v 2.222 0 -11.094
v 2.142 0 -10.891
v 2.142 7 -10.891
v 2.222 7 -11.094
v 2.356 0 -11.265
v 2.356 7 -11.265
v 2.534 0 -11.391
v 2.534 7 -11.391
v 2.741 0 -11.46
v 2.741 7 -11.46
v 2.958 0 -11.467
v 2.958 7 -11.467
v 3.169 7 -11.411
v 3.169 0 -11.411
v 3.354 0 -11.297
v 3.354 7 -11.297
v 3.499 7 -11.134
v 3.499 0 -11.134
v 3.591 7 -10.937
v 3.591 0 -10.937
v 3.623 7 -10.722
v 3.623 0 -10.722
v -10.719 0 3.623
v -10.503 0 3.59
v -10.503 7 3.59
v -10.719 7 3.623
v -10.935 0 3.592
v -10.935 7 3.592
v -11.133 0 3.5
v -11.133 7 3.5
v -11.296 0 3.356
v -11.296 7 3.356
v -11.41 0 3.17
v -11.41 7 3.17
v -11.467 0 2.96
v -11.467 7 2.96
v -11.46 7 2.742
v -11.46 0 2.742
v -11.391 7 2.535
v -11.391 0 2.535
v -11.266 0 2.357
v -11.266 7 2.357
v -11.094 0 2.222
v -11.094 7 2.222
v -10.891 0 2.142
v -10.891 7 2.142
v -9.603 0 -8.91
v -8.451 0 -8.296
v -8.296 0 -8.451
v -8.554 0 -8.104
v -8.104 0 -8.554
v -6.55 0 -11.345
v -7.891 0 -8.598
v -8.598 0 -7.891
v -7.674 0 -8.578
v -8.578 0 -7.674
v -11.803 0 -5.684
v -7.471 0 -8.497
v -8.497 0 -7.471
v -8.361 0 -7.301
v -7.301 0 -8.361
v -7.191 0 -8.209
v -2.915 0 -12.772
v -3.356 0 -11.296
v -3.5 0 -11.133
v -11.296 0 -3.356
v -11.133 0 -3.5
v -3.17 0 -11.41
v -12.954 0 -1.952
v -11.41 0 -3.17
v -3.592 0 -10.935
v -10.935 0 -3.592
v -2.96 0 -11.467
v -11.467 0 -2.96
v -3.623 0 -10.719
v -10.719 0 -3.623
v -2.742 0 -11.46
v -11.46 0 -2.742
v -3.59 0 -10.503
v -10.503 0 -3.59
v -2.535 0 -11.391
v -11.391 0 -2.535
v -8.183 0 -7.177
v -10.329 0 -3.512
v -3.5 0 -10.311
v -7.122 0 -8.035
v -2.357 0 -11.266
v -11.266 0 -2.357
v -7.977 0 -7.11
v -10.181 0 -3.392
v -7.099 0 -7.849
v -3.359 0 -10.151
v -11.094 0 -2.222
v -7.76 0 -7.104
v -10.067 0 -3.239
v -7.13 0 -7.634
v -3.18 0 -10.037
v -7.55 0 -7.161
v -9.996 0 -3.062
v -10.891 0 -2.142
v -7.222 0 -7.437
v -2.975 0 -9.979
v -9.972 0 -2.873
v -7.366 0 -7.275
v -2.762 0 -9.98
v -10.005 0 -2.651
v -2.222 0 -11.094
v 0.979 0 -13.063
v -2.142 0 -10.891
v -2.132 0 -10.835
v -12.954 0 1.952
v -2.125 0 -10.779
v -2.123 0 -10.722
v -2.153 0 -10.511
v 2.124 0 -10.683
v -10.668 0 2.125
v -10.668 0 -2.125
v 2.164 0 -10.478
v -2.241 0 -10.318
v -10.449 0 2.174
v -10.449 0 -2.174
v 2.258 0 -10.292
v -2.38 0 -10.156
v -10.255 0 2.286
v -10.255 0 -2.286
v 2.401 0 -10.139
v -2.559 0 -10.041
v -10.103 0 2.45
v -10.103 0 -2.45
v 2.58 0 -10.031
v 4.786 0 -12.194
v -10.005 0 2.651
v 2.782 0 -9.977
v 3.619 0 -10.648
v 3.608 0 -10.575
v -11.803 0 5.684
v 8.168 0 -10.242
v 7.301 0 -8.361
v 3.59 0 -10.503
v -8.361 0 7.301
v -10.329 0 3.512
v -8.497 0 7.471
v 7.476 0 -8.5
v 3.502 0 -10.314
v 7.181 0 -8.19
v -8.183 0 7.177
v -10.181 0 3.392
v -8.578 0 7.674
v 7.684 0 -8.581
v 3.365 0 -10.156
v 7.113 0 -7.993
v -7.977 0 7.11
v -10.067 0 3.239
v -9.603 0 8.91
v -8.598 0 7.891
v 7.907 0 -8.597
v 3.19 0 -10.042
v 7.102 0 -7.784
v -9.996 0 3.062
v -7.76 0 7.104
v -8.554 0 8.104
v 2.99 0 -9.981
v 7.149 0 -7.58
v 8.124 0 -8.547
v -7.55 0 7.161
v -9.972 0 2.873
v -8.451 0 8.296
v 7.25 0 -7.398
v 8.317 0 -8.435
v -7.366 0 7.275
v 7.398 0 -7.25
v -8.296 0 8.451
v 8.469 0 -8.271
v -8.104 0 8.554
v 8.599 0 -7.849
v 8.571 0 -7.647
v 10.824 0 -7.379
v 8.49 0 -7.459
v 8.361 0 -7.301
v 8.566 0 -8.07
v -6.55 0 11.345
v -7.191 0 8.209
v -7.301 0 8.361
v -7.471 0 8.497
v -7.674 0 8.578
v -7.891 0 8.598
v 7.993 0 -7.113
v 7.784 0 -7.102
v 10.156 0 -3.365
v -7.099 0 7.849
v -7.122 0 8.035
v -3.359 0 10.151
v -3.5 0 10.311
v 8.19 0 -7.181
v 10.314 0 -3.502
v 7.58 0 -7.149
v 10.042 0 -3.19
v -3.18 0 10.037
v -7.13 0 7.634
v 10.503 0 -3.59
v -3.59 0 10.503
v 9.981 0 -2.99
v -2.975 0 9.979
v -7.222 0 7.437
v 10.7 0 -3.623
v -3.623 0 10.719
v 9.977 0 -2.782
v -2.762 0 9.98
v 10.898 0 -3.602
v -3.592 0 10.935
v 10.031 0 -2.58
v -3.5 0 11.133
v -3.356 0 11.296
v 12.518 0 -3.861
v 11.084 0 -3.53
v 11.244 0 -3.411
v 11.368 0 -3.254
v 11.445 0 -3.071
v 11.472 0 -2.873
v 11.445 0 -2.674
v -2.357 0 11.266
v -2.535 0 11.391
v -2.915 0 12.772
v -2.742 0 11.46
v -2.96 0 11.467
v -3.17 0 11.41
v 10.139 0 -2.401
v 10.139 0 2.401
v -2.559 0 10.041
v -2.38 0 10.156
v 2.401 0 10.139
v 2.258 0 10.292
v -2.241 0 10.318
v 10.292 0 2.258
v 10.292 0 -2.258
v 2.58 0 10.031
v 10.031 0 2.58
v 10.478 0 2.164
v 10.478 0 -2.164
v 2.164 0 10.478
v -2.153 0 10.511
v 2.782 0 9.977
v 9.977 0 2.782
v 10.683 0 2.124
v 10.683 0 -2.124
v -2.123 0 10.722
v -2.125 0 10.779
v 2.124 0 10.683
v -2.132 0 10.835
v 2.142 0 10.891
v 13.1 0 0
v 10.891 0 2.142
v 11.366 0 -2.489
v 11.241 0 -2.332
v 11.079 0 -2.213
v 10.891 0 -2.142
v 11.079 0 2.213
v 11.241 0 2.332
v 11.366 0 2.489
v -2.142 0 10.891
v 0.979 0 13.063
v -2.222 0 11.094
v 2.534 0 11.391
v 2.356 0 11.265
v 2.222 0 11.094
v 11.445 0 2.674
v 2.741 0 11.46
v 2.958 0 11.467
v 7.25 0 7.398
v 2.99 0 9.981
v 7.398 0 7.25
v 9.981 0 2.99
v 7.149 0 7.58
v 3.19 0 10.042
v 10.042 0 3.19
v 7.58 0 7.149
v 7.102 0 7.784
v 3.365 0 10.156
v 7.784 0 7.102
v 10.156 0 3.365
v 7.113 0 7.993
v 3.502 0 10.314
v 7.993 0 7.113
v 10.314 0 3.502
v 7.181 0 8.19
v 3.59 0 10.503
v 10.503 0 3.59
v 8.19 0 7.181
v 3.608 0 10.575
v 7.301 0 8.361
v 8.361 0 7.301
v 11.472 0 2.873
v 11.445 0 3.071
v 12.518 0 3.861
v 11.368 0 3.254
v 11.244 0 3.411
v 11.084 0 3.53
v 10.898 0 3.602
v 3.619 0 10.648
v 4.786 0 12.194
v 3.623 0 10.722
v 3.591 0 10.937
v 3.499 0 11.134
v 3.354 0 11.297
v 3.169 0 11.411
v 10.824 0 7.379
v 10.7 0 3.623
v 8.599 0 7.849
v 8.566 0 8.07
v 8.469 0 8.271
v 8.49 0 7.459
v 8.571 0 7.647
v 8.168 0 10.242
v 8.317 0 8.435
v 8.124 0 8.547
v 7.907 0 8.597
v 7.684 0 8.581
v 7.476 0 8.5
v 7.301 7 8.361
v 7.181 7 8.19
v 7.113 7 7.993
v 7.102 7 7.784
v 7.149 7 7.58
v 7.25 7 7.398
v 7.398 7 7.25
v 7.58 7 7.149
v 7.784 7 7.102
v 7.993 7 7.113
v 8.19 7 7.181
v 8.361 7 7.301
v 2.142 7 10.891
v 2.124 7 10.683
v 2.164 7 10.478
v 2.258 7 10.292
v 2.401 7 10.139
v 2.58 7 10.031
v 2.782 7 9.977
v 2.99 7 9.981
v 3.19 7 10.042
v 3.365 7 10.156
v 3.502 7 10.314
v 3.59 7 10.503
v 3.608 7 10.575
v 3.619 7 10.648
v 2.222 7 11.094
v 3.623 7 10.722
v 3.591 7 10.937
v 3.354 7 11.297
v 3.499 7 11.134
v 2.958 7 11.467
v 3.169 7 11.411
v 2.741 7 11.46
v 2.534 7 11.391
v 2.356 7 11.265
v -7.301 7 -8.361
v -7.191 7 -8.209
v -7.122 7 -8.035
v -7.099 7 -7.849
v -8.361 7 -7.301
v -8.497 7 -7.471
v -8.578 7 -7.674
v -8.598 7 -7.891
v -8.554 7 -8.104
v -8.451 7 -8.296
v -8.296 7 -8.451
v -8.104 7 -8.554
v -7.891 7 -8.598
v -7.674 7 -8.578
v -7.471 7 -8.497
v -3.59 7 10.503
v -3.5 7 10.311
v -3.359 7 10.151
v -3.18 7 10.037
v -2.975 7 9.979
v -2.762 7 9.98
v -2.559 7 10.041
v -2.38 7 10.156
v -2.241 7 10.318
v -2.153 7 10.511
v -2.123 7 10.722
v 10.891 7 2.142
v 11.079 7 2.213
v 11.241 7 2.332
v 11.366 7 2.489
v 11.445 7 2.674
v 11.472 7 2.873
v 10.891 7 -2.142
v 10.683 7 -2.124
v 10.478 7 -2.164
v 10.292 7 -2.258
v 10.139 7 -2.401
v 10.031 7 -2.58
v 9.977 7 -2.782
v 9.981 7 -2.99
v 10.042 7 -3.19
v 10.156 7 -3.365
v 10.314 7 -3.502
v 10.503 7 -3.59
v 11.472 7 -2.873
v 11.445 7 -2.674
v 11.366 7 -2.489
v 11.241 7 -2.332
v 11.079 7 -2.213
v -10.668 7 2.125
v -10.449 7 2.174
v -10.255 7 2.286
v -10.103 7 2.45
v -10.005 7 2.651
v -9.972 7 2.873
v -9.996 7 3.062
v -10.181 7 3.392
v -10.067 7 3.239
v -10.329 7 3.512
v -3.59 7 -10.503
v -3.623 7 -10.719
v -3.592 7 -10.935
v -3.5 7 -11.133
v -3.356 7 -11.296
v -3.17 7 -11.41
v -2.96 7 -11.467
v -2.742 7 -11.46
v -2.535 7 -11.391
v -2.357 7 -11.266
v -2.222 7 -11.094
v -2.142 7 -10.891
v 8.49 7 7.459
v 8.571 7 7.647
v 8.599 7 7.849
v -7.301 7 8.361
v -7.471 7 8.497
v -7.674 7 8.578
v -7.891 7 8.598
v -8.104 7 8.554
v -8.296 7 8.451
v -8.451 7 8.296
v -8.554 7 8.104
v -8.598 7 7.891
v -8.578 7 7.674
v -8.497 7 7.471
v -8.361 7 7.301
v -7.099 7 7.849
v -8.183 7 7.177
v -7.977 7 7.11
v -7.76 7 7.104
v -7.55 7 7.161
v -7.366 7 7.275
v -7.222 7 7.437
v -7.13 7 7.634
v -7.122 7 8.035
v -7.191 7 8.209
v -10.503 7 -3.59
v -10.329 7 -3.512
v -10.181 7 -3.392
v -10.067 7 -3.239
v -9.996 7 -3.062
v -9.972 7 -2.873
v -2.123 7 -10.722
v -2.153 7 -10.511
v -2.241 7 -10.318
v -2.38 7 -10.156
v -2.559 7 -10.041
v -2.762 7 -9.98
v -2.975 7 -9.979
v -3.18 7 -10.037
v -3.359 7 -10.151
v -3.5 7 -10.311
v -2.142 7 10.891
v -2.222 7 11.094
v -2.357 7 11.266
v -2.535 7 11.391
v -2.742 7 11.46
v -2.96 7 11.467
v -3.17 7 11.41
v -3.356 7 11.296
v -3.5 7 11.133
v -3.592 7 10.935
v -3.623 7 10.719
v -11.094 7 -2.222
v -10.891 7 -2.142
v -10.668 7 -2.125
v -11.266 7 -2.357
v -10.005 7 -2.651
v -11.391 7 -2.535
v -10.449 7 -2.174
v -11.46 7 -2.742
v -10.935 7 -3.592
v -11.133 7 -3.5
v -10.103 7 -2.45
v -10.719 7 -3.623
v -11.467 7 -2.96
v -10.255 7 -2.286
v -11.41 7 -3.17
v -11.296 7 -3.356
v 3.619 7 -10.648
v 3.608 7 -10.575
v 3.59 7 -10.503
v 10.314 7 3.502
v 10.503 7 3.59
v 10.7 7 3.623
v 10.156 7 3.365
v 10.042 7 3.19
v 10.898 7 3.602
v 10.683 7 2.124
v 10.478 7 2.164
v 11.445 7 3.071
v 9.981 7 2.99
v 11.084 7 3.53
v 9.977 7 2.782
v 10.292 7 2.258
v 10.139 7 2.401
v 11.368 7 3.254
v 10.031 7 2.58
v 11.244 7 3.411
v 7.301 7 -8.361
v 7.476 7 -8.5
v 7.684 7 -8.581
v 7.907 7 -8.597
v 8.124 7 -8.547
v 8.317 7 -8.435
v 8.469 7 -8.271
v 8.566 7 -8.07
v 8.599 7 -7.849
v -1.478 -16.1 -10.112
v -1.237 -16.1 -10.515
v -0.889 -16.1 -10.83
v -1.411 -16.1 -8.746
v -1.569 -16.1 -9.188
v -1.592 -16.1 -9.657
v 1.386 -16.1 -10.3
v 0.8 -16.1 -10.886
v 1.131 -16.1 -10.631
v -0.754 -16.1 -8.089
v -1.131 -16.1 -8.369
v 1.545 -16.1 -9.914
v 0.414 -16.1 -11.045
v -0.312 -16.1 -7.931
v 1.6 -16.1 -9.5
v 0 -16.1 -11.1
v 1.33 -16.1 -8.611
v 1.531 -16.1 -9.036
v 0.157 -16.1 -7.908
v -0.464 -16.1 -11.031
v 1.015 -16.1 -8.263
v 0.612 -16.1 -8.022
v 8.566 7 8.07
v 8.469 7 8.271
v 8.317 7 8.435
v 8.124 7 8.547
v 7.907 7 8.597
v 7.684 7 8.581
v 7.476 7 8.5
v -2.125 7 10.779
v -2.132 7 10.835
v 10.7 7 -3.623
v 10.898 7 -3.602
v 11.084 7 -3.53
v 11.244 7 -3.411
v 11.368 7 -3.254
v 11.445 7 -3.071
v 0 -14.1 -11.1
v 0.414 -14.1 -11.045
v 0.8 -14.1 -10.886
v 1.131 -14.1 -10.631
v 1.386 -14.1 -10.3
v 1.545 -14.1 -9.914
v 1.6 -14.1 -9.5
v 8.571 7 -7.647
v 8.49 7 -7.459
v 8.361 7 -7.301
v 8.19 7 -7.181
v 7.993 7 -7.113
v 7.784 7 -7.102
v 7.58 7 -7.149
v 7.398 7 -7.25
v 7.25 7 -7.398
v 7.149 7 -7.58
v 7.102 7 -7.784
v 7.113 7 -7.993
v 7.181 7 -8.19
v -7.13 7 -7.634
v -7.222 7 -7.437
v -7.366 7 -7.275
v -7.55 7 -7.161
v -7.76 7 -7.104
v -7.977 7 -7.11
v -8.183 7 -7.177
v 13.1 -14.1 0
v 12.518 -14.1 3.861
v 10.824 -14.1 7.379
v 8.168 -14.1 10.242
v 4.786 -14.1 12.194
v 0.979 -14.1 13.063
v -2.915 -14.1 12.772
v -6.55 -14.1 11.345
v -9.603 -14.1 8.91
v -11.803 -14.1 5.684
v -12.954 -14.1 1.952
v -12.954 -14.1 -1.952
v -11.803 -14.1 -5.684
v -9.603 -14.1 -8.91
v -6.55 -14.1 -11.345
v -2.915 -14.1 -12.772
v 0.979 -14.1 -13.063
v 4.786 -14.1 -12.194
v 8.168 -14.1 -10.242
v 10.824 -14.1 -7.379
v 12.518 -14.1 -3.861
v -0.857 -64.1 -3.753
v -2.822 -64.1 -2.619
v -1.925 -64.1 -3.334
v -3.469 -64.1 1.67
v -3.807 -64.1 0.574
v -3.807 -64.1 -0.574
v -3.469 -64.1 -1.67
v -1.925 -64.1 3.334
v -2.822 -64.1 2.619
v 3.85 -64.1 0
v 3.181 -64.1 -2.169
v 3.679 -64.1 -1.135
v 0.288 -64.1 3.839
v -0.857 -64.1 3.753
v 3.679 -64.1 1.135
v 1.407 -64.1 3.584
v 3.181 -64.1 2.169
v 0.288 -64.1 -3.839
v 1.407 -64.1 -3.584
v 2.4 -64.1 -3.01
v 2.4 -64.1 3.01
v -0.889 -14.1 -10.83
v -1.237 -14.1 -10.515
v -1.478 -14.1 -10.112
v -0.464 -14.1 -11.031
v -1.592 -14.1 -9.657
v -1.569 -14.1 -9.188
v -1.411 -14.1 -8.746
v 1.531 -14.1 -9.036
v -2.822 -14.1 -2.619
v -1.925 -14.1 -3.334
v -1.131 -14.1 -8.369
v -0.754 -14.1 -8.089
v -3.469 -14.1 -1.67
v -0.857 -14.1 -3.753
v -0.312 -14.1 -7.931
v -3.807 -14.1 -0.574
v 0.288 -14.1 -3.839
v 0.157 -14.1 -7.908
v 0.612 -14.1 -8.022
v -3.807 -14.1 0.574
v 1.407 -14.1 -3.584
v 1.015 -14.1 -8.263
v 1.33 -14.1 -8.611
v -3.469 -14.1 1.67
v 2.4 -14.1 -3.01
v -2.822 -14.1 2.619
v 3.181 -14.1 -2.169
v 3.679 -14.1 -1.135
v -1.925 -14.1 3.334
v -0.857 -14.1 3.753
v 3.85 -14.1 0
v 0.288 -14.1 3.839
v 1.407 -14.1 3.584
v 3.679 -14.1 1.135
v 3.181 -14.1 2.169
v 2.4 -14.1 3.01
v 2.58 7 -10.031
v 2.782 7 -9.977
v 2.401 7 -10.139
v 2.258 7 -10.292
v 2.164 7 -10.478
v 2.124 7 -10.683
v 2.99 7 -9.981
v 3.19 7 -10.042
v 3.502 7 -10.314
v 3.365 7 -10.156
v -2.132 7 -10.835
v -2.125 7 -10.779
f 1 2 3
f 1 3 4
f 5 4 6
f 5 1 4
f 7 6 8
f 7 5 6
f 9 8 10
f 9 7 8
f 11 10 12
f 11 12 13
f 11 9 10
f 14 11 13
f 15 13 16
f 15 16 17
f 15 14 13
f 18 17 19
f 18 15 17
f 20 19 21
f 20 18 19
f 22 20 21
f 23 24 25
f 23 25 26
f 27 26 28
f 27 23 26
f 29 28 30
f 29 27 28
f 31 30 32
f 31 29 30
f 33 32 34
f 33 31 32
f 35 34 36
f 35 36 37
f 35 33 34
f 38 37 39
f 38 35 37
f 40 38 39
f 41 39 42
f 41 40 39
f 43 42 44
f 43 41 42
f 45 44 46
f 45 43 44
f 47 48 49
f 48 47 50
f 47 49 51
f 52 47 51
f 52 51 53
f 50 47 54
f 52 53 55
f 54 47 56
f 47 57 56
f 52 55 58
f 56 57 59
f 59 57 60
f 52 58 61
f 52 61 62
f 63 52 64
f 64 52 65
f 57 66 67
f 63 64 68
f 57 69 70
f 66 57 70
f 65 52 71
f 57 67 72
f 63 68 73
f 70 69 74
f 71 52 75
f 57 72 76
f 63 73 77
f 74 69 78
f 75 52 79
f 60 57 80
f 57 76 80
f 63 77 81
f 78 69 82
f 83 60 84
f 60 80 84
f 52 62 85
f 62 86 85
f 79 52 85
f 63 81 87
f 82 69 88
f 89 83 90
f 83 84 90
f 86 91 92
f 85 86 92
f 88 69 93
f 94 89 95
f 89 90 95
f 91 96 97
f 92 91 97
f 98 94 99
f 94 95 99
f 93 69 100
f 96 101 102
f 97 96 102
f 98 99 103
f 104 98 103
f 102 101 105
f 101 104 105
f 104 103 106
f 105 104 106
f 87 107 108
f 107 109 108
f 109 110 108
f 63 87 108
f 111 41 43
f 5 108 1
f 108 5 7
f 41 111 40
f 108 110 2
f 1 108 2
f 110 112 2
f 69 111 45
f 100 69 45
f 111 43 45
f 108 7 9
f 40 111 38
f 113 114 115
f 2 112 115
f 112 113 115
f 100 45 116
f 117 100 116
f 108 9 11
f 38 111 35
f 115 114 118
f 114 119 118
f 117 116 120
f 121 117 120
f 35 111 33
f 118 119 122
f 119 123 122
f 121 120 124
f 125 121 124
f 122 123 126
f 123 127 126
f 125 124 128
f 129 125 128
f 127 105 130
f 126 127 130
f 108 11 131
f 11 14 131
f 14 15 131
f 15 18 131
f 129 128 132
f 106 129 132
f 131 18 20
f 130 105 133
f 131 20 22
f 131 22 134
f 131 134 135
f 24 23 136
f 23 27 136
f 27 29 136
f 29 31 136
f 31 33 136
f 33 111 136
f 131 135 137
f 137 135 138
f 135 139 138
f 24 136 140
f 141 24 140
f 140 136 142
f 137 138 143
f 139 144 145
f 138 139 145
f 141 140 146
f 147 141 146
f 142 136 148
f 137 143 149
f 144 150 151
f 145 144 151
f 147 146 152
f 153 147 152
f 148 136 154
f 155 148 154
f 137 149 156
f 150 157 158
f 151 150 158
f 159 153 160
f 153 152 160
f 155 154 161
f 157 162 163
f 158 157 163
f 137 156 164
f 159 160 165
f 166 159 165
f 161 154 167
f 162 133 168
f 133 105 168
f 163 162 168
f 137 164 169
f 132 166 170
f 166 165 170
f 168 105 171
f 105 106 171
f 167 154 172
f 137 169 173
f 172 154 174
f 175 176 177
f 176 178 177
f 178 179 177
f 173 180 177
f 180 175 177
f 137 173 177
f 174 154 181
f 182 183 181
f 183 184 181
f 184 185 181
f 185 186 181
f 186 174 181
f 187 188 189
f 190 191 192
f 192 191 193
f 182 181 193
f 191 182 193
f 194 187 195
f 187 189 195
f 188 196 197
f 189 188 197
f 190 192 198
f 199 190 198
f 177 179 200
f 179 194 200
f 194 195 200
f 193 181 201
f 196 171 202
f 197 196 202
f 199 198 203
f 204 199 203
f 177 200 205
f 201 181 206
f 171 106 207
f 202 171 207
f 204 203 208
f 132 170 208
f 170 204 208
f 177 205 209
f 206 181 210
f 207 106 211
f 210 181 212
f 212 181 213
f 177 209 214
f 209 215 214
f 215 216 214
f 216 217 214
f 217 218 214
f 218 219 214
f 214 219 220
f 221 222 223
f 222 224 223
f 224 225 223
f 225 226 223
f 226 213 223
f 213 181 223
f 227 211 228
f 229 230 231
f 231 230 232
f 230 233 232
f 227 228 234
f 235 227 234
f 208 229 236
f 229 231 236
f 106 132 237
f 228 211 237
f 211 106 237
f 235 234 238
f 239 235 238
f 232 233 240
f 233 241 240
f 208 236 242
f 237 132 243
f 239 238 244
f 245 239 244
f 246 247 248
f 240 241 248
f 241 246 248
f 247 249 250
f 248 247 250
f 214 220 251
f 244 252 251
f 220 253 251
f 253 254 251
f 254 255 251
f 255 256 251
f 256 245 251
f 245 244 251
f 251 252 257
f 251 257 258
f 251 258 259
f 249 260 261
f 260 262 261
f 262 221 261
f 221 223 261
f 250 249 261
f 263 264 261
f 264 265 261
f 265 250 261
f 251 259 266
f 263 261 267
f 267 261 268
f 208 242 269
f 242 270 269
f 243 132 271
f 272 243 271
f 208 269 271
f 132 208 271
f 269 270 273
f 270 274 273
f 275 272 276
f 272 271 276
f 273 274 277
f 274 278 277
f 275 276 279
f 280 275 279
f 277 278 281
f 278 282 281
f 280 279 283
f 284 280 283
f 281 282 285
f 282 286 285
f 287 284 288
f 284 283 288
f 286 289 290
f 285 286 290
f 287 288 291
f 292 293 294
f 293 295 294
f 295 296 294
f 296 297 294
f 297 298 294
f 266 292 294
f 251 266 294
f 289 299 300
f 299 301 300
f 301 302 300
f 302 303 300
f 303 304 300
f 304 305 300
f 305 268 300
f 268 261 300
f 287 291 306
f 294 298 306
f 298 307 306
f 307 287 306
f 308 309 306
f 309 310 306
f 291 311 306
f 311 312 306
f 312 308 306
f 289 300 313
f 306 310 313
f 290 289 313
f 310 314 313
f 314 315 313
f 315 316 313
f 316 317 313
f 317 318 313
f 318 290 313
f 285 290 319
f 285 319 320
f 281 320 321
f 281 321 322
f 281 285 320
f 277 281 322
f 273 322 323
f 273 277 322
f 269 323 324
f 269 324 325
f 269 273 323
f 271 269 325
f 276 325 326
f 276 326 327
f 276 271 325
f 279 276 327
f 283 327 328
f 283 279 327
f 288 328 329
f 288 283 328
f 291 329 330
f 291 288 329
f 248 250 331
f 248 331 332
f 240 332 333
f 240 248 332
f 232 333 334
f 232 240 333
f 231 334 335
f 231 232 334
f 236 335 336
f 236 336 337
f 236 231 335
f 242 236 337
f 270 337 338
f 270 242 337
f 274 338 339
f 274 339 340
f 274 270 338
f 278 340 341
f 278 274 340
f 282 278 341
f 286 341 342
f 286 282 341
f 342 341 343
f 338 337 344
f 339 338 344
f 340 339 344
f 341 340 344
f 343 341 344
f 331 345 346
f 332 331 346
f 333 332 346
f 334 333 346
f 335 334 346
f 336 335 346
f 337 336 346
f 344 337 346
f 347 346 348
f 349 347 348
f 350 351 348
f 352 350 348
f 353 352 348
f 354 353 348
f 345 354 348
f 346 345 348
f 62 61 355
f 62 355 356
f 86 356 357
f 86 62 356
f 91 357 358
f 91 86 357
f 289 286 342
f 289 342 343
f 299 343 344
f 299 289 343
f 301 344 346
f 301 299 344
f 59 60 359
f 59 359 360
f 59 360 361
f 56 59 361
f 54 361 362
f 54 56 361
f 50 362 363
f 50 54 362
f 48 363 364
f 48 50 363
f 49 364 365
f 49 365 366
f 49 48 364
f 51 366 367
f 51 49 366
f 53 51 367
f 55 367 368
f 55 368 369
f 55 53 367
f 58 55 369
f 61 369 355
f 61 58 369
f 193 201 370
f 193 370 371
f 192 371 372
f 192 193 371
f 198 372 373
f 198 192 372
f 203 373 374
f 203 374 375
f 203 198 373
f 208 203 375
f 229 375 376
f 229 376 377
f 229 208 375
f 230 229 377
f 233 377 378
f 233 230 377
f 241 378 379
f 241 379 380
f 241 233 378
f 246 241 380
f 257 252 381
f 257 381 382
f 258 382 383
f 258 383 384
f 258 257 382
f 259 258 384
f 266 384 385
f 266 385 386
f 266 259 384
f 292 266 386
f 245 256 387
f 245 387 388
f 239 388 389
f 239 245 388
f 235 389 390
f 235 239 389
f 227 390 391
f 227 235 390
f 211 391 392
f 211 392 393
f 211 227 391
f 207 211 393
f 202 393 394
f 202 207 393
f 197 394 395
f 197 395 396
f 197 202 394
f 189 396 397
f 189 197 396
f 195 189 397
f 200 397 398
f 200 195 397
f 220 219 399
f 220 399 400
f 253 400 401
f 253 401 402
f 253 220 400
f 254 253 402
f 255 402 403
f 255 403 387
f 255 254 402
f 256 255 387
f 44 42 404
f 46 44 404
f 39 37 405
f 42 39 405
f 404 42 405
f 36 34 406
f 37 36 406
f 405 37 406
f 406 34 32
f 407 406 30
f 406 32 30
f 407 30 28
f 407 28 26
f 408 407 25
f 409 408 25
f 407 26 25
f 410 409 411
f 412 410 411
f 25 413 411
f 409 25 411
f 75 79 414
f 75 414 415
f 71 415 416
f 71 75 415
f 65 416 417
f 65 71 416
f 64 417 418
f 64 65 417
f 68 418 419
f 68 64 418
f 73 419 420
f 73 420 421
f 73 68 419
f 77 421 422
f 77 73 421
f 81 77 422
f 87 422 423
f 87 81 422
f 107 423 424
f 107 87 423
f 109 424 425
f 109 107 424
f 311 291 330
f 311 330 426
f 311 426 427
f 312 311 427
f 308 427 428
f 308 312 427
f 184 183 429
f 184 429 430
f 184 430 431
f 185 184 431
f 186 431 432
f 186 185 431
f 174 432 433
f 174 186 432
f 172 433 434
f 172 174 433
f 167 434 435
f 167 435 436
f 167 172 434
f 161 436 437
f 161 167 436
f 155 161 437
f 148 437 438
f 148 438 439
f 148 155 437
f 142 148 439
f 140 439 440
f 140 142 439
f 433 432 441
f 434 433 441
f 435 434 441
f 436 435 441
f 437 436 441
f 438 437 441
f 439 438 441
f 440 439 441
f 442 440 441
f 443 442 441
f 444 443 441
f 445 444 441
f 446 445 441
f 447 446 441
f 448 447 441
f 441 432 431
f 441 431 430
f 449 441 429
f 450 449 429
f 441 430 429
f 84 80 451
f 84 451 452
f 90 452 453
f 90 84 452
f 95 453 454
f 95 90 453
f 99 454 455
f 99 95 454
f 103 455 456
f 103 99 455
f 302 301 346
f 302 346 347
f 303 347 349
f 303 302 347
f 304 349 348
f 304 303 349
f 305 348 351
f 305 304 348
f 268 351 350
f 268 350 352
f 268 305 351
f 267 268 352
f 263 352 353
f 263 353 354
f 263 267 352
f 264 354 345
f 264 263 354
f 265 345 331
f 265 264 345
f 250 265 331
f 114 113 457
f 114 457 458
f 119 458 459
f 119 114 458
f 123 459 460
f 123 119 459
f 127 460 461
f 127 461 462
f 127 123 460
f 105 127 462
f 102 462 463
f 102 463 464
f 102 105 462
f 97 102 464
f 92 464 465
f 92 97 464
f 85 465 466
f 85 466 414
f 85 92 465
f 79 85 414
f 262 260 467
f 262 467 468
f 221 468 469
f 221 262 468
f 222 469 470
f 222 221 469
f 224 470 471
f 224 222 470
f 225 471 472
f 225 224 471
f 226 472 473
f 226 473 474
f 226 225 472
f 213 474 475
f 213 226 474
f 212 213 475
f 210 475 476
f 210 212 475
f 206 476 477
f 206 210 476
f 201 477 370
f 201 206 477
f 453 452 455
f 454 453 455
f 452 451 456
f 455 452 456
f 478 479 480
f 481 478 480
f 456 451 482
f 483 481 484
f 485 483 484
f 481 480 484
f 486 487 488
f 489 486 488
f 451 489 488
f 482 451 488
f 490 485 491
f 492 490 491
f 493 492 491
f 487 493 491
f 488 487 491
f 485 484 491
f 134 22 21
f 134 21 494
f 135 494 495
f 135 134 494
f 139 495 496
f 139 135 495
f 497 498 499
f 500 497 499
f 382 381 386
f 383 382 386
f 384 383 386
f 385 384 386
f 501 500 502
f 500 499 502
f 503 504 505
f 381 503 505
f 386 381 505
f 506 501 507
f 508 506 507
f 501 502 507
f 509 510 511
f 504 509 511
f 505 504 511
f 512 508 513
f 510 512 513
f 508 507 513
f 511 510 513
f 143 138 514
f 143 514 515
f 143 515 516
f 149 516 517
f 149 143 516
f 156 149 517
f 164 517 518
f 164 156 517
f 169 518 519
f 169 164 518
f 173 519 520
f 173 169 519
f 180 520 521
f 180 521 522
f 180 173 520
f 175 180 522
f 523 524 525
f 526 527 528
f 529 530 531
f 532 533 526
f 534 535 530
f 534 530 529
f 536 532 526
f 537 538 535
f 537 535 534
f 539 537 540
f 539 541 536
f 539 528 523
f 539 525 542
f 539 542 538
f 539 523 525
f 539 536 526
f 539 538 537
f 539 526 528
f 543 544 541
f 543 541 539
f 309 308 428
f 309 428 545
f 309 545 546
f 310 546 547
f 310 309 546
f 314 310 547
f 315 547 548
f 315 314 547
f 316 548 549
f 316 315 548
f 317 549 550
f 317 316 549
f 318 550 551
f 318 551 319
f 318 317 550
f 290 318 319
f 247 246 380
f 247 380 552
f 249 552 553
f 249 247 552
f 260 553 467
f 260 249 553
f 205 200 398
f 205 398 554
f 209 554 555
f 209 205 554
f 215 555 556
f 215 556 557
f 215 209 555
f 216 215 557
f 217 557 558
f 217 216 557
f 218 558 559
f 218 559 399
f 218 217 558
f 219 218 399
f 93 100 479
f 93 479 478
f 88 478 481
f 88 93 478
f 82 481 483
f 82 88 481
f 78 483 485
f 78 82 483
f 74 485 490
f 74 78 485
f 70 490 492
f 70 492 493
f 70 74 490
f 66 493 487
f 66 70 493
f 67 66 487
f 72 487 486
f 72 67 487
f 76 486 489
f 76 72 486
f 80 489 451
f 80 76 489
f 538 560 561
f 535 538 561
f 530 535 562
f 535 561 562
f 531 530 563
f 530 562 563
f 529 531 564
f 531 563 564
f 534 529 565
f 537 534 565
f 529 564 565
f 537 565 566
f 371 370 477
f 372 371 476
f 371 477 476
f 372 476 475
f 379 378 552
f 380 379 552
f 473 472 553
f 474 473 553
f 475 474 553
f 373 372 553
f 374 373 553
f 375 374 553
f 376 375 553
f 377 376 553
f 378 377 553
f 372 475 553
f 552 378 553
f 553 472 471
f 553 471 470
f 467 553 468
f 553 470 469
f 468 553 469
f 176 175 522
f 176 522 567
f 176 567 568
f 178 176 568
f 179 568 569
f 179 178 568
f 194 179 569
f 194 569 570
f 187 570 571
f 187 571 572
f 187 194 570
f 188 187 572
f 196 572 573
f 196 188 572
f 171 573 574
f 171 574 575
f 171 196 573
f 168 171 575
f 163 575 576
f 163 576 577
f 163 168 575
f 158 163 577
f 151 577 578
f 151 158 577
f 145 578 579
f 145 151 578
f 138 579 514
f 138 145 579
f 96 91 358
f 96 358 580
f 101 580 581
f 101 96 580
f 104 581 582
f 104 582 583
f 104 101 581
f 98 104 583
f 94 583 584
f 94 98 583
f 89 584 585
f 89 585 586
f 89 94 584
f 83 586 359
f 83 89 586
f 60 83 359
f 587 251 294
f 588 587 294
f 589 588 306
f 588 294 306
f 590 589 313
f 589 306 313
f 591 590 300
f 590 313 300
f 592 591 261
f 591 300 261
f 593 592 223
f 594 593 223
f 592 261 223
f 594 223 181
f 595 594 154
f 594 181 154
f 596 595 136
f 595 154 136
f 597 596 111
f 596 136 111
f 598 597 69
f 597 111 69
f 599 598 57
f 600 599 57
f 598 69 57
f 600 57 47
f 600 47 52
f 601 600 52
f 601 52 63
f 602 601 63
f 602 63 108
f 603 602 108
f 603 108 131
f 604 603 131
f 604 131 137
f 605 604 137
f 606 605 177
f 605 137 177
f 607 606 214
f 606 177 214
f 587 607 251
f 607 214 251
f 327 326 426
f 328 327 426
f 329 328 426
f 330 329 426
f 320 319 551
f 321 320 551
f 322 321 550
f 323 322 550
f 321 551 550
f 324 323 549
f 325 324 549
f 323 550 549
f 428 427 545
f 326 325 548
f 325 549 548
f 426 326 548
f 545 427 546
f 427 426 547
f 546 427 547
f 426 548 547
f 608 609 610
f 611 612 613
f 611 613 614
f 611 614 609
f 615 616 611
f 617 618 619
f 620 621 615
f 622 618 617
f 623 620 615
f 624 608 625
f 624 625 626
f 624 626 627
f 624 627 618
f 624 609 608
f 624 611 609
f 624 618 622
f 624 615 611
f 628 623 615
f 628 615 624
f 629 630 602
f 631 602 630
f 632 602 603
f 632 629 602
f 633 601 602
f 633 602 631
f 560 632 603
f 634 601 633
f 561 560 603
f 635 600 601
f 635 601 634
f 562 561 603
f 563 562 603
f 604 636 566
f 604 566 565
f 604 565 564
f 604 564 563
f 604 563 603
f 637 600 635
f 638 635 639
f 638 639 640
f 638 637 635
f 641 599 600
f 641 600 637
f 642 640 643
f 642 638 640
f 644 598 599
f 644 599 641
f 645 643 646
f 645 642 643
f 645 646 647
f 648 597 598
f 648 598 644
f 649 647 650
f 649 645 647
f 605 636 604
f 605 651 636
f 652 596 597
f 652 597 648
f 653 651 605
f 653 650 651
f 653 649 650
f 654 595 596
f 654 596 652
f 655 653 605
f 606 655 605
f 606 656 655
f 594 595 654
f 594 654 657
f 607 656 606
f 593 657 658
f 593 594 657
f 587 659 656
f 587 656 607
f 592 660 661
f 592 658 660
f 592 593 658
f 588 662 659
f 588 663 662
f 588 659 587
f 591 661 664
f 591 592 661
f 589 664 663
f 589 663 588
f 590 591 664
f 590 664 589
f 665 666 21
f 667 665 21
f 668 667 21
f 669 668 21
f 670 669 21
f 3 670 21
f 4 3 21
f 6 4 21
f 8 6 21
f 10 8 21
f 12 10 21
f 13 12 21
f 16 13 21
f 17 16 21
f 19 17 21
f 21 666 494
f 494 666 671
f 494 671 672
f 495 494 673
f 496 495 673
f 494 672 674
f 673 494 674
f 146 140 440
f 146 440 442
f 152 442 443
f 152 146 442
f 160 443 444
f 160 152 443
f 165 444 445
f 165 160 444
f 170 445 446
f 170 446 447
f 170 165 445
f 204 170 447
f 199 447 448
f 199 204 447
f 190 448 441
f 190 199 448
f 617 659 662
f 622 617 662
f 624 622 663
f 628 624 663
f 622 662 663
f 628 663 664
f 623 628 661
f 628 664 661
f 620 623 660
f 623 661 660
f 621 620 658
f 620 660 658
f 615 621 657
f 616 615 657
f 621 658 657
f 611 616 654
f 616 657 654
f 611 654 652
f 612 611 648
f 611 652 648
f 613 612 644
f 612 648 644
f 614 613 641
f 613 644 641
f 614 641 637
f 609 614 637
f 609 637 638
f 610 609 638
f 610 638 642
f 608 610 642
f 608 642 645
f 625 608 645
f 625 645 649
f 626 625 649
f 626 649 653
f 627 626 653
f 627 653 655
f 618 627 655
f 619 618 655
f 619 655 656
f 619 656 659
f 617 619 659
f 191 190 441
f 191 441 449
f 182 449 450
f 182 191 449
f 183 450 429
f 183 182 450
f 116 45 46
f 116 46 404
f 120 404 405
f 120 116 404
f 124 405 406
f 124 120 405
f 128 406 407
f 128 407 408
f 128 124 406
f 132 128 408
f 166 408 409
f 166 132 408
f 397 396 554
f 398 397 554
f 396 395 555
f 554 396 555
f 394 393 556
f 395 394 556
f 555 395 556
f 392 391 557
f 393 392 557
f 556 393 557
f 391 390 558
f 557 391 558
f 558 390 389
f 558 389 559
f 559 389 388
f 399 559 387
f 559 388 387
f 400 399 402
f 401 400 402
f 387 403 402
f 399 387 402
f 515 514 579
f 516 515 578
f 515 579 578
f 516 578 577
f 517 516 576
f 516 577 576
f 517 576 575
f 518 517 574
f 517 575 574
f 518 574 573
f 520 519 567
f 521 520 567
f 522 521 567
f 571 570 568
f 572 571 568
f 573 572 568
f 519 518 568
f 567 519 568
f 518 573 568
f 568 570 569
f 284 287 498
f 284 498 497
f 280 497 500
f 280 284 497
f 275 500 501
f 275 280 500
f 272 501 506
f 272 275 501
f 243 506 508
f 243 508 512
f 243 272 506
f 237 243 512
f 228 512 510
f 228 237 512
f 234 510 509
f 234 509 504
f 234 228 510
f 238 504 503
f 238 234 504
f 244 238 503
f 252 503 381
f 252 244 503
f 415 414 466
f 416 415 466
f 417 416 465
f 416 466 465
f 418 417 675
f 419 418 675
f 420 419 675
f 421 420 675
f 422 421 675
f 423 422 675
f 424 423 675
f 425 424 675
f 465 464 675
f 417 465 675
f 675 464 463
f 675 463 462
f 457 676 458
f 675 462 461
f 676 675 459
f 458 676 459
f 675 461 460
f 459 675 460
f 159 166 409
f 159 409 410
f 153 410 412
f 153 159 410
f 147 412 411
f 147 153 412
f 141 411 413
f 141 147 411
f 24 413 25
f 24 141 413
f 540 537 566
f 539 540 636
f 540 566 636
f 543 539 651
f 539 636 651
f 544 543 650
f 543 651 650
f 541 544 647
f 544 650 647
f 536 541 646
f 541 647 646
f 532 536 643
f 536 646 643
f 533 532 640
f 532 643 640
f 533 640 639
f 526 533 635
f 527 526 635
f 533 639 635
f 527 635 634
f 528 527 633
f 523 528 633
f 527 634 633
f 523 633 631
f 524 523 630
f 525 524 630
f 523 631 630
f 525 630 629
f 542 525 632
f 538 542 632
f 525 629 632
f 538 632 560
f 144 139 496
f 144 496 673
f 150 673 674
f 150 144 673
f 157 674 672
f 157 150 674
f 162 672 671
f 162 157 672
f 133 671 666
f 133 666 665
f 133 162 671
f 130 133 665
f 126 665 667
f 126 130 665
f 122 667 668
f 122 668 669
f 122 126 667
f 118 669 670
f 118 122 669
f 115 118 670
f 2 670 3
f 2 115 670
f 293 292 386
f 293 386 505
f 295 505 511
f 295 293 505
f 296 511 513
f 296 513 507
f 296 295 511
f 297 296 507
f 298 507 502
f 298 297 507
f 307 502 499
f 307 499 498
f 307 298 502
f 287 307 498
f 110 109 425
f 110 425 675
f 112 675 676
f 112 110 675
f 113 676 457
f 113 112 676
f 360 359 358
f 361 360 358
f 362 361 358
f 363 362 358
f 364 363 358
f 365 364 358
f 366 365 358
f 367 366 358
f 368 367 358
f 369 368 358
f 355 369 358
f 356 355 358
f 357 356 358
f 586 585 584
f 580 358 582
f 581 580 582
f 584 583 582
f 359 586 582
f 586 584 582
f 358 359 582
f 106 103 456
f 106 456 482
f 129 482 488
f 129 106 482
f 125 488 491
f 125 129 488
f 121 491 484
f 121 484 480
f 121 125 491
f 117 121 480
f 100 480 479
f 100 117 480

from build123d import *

# Parameters (mm, degrees)
F0_R     = 13.1
F0_R_2   = 3.85
F1_DEPTH = 14.1
F2_DEPTH = 16.1
F3_DEPTH = 64.1
F4_DEPTH = 7


with BuildPart() as f1:
    # F0 (on Front) → F1 (new body)
    with BuildSketch(Plane.XZ):
        Circle(F0_R)
        with BuildLine():
            ThreePointArc((2.1423026541, 10.8913056765), (2.9582097459, 11.4669080562), (3.6228914006, 10.7217766718))
            ThreePointArc((3.6228914006, 10.7217766718), (3.6147150614, 10.6113336716), (3.5903643172, 10.5032987232))
            ThreePointArc((3.5903643172, 10.5032987232), (5.55, 9.612881982), (7.3009413593, 8.3609960692))
            ThreePointArc((7.3009413593, 8.3609960692), (8.1241506577, 8.5465449066), (8.5988852712, 7.8488852712))
            ThreePointArc((8.5988852712, 7.8488852712), (8.5368471518, 7.5502074334), (8.3609960692, 7.3009413593))
            ThreePointArc((8.3609960692, 7.3009413593), (9.612881982, 5.55), (10.5032987232, 3.5903643172))
            ThreePointArc((10.5032987232, 3.5903643172), (11.1682302184, 3.475534936), (11.4717766718, 2.8728914006))
            ThreePointArc((11.4717766718, 2.8728914006), (11.3089933071, 2.4063331264), (10.8913056765, 2.1423026541))
            ThreePointArc((10.8913056765, 2.1423026541), (11.047703223, 1.0762218617), (11.1, 0))
            ThreePointArc((11.1, 0), (11.047703223, -1.0762218617), (10.8913056765, -2.1423026541))
            ThreePointArc((10.8913056765, -2.1423026541), (11.3089933071, -2.4063331264), (11.4717766718, -2.8728914006))
            ThreePointArc((11.4717766718, -2.8728914006), (11.1682302184, -3.475534936), (10.5032987232, -3.5903643172))
            ThreePointArc((10.5032987232, -3.5903643172), (9.612881982, -5.55), (8.3609960692, -7.3009413593))
            ThreePointArc((8.3609960692, -7.3009413593), (8.5368471518, -7.5502074334), (8.5988852712, -7.8488852712))
            ThreePointArc((8.5988852712, -7.8488852712), (8.1241506577, -8.5465449066), (7.3009413593, -8.3609960692))
            ThreePointArc((7.3009413593, -8.3609960692), (5.55, -9.612881982), (3.5903643172, -10.5032987232))
            ThreePointArc((3.5903643172, -10.5032987232), (3.6147150614, -10.6113336716), (3.6228914006, -10.7217766718))
            ThreePointArc((3.6228914006, -10.7217766718), (2.9582097459, -11.4669080562), (2.1423026541, -10.8913056765))
            ThreePointArc((2.1423026541, -10.8913056765), (1.0762218494, -11.0477032242), (-2.47e-08, -11.1))
            ThreePointArc((-2.47e-08, -11.1), (-1.076221874, -11.0477032218), (-2.1423026541, -10.8913056765))
            ThreePointArc((-2.1423026541, -10.8913056765), (-3.0670056845, -11.4462210415), (-3.5903643172, -10.5032987232))
            ThreePointArc((-3.5903643172, -10.5032987232), (-5.55, -9.612881982), (-7.3009413593, -8.3609960692))
            ThreePointArc((-7.3009413593, -8.3609960692), (-8.3792153571, -8.3792153571), (-8.3609960692, -7.3009413593))
            ThreePointArc((-8.3609960692, -7.3009413593), (-9.612881982, -5.55), (-10.5032987232, -3.5903643172))
            ThreePointArc((-10.5032987232, -3.5903643172), (-11.4462210415, -3.0670056845), (-10.8913056765, -2.1423026541))
            ThreePointArc((-10.8913056765, -2.1423026541), (-11.1, 0), (-10.8913056765, 2.1423026541))
            ThreePointArc((-10.8913056765, 2.1423026541), (-11.4462210415, 3.0670056845), (-10.5032987232, 3.5903643172))
            ThreePointArc((-10.5032987232, 3.5903643172), (-9.612881982, 5.55), (-8.3609960692, 7.3009413593))
            ThreePointArc((-8.3609960692, 7.3009413593), (-8.3792153571, 8.3792153571), (-7.3009413593, 8.3609960692))
            ThreePointArc((-7.3009413593, 8.3609960692), (-5.55, 9.612881982), (-3.5903643172, 10.5032987232))
            ThreePointArc((-3.5903643172, 10.5032987232), (-3.0670056845, 11.4462210415), (-2.1423026541, 10.8913056765))
            ThreePointArc((-2.1423026541, 10.8913056765), (0, 11.1), (2.1423026541, 10.8913056765))
        make_face(mode=Mode.SUBTRACT)
        with BuildLine():
            ThreePointArc((3.5903643172, 10.5032987232), (2.8728914006, 10.7217766718), (2.1423026541, 10.8913056765))
            ThreePointArc((2.1423026541, 10.8913056765), (2.6787771168, 9.9973323021), (3.5903643172, 10.5032987232))
        make_face()
        with BuildLine():
            ThreePointArc((-3.5903643172, 10.5032987232), (-2.8728914006, 10.7217766718), (-2.1423026541, 10.8913056765))
            ThreePointArc((-2.1423026541, 10.8913056765), (-3.0670056845, 11.4462210415), (-3.5903643172, 10.5032987232))
        make_face()
        with BuildLine():
            ThreePointArc((8.3609960692, 7.3009413593), (7.8488852712, 7.8488852712), (7.3009413593, 8.3609960692))
            ThreePointArc((7.3009413593, 8.3609960692), (7.3185551853, 7.3185551853), (8.3609960692, 7.3009413593))
        make_face()
        with BuildLine():
            ThreePointArc((11.4717766718, 2.8728914006), (11.1682302184, 3.475534936), (10.5032987232, 3.5903643172))
            ThreePointArc((10.5032987232, 3.5903643172), (10.7217766718, 2.8728914006), (10.8913056765, 2.1423026541))
            ThreePointArc((10.8913056765, 2.1423026541), (11.3089933071, 2.4063331264), (11.4717766718, 2.8728914006))
        make_face()
        with BuildLine():
            ThreePointArc((10.5032987232, -3.5903643172), (10.7217766718, -2.8728914006), (10.8913056765, -2.1423026541))
            ThreePointArc((10.8913056765, -2.1423026541), (9.9973323021, -2.6787771168), (10.5032987232, -3.5903643172))
        make_face()
        with BuildLine():
            ThreePointArc((7.3009413593, -8.3609960692), (7.8488852712, -7.8488852712), (8.3609960692, -7.3009413593))
            ThreePointArc((8.3609960692, -7.3009413593), (7.3185551853, -7.3185551853), (7.3009413593, -8.3609960692))
        make_face()
        with BuildLine():
            ThreePointArc((2.1423026541, -10.8913056765), (2.8728914006, -10.7217766718), (3.5903643172, -10.5032987232))
            ThreePointArc((3.5903643172, -10.5032987232), (2.6787771168, -9.9973323021), (2.1423026541, -10.8913056765))
        make_face()
        with BuildLine():
            ThreePointArc((-8.3609960692, 7.3009413593), (-7.8488852712, 7.8488852712), (-7.3009413593, 8.3609960692))
            ThreePointArc((-7.3009413593, 8.3609960692), (-8.3792153571, 8.3792153571), (-8.3609960692, 7.3009413593))
        make_face()
        with BuildLine():
            ThreePointArc((-10.8913056765, 2.1423026541), (-10.7217766718, 2.8728914006), (-10.5032987232, 3.5903643172))
            ThreePointArc((-10.5032987232, 3.5903643172), (-11.4462210415, 3.0670056845), (-10.8913056765, 2.1423026541))
        make_face()
        with BuildLine():
            ThreePointArc((-10.5032987232, -3.5903643172), (-10.7217766718, -2.8728914006), (-10.8913056765, -2.1423026541))
            ThreePointArc((-10.8913056765, -2.1423026541), (-11.4462210415, -3.0670056845), (-10.5032987232, -3.5903643172))
        make_face()
        with BuildLine():
            ThreePointArc((-7.3009413593, -8.3609960692), (-7.8488852712, -7.8488852712), (-8.3609960692, -7.3009413593))
            ThreePointArc((-8.3609960692, -7.3009413593), (-8.3792153571, -8.3792153571), (-7.3009413593, -8.3609960692))
        make_face()
        with BuildLine():
            ThreePointArc((-2.1423026541, -10.8913056765), (-2.8728914006, -10.7217766718), (-3.5903643172, -10.5032987232))
            ThreePointArc((-3.5903643172, -10.5032987232), (-3.0670056845, -11.4462210415), (-2.1423026541, -10.8913056765))
        make_face()
        with BuildLine():
            ThreePointArc((3.5903643172, 10.5032987232), (2.6787771168, 9.9973323021), (2.1423026541, 10.8913056765))
            ThreePointArc((2.1423026541, 10.8913056765), (0, 11.1), (-2.1423026541, 10.8913056765))
            ThreePointArc((-2.1423026541, 10.8913056765), (-2.1277600163, 10.8070950171), (-2.1228914006, 10.7217766718))
            ThreePointArc((-2.1228914006, 10.7217766718), (-2.7624484004, 9.979953011), (-3.5903643172, 10.5032987232))
            ThreePointArc((-3.5903643172, 10.5032987232), (-5.55, 9.612881982), (-7.3009413593, 8.3609960692))
            ThreePointArc((-7.3009413593, 8.3609960692), (-7.1512256357, 8.1241506577), (-7.0988852712, 7.8488852712))
            ThreePointArc((-7.0988852712, 7.8488852712), (-7.5502074334, 7.1609233905), (-8.3609960692, 7.3009413593))
            ThreePointArc((-8.3609960692, 7.3009413593), (-9.612881982, 5.55), (-10.5032987232, 3.5903643172))
            ThreePointArc((-10.5032987232, 3.5903643172), (-10.1191331364, 3.3193449473), (-9.9717766718, 2.8728914006))
            ThreePointArc((-9.9717766718, 2.8728914006), (-10.2552183976, 2.2856747654), (-10.8913056765, 2.1423026541))
            ThreePointArc((-10.8913056765, 2.1423026541), (-11.1, 0), (-10.8913056765, -2.1423026541))
            ThreePointArc((-10.8913056765, -2.1423026541), (-10.2552183976, -2.2856747654), (-9.9717766718, -2.8728914006))
            ThreePointArc((-9.9717766718, -2.8728914006), (-10.1191331364, -3.3193449473), (-10.5032987232, -3.5903643172))
            ThreePointArc((-10.5032987232, -3.5903643172), (-9.612881982, -5.55), (-8.3609960692, -7.3009413593))
            ThreePointArc((-8.3609960692, -7.3009413593), (-7.5502074334, -7.1609233905), (-7.0988852712, -7.8488852712))
            ThreePointArc((-7.0988852712, -7.8488852712), (-7.1512256357, -8.1241506577), (-7.3009413593, -8.3609960692))
            ThreePointArc((-7.3009413593, -8.3609960692), (-5.55, -9.612881982), (-3.5903643172, -10.5032987232))
            ThreePointArc((-3.5903643172, -10.5032987232), (-2.7624484004, -9.979953011), (-2.1228914006, -10.7217766718))
            ThreePointArc((-2.1228914006, -10.7217766718), (-2.1277600163, -10.8070950171), (-2.1423026541, -10.8913056765))
            ThreePointArc((-2.1423026541, -10.8913056765), (-1.076221874, -11.0477032218), (-2.47e-08, -11.1))
            ThreePointArc((-2.47e-08, -11.1), (1.0762218494, -11.0477032242), (2.1423026541, -10.8913056765))
            ThreePointArc((2.1423026541, -10.8913056765), (2.6787771168, -9.9973323021), (3.5903643172, -10.5032987232))
            ThreePointArc((3.5903643172, -10.5032987232), (5.55, -9.612881982), (7.3009413593, -8.3609960692))
            ThreePointArc((7.3009413593, -8.3609960692), (7.3185551853, -7.3185551853), (8.3609960692, -7.3009413593))
            ThreePointArc((8.3609960692, -7.3009413593), (9.612881982, -5.55), (10.5032987232, -3.5903643172))
            ThreePointArc((10.5032987232, -3.5903643172), (9.9973323021, -2.6787771168), (10.8913056765, -2.1423026541))
            ThreePointArc((10.8913056765, -2.1423026541), (11.047703223, -1.0762218617), (11.1, 0))
            ThreePointArc((11.1, 0), (11.047703223, 1.0762218617), (10.8913056765, 2.1423026541))
            ThreePointArc((10.8913056765, 2.1423026541), (9.9973323021, 2.6787771168), (10.5032987232, 3.5903643172))
            ThreePointArc((10.5032987232, 3.5903643172), (9.612881982, 5.55), (8.3609960692, 7.3009413593))
            ThreePointArc((8.3609960692, 7.3009413593), (7.3185551853, 7.3185551853), (7.3009413593, 8.3609960692))
            ThreePointArc((7.3009413593, 8.3609960692), (5.55, 9.612881982), (3.5903643172, 10.5032987232))
        make_face()
        with BuildLine():
            ThreePointArc((1.6, -9.5), (1.1313708412, -10.6313708586), (-2.47e-08, -11.1))
            ThreePointArc((-2.47e-08, -11.1), (-1.1313708412, -8.3686291414), (1.6, -9.5))
        make_face(mode=Mode.SUBTRACT)
        Circle(F0_R_2, mode=Mode.SUBTRACT)
        with BuildLine():
            ThreePointArc((-7.0988852712, 7.8488852712), (-7.1512256357, 8.1241506577), (-7.3009413593, 8.3609960692))
            ThreePointArc((-7.3009413593, 8.3609960692), (-7.8488852712, 7.8488852712), (-8.3609960692, 7.3009413593))
            ThreePointArc((-8.3609960692, 7.3009413593), (-7.5502074334, 7.1609233905), (-7.0988852712, 7.8488852712))
        make_face()
        with BuildLine():
            ThreePointArc((-2.1228914006, 10.7217766718), (-2.1277600163, 10.8070950171), (-2.1423026541, 10.8913056765))
            ThreePointArc((-2.1423026541, 10.8913056765), (-2.8728914006, 10.7217766718), (-3.5903643172, 10.5032987232))
            ThreePointArc((-3.5903643172, 10.5032987232), (-2.7624484004, 9.979953011), (-2.1228914006, 10.7217766718))
        make_face()
        with BuildLine():
            ThreePointArc((3.5903643172, 10.5032987232), (3.6147150614, 10.6113336716), (3.6228914006, 10.7217766718))
            ThreePointArc((3.6228914006, 10.7217766718), (2.9582097459, 11.4669080562), (2.1423026541, 10.8913056765))
            ThreePointArc((2.1423026541, 10.8913056765), (2.8728914006, 10.7217766718), (3.5903643172, 10.5032987232))
        make_face()
        with BuildLine():
            ThreePointArc((8.5988852712, 7.8488852712), (8.1241506577, 8.5465449066), (7.3009413593, 8.3609960692))
            ThreePointArc((7.3009413593, 8.3609960692), (7.8488852712, 7.8488852712), (8.3609960692, 7.3009413593))
            ThreePointArc((8.3609960692, 7.3009413593), (8.5368471518, 7.5502074334), (8.5988852712, 7.8488852712))
        make_face()
        with BuildLine():
            ThreePointArc((10.8913056765, 2.1423026541), (10.7217766718, 2.8728914006), (10.5032987232, 3.5903643172))
            ThreePointArc((10.5032987232, 3.5903643172), (9.9973323021, 2.6787771168), (10.8913056765, 2.1423026541))
        make_face()
        with BuildLine():
            ThreePointArc((11.4717766718, -2.8728914006), (11.3089933071, -2.4063331264), (10.8913056765, -2.1423026541))
            ThreePointArc((10.8913056765, -2.1423026541), (10.7217766718, -2.8728914006), (10.5032987232, -3.5903643172))
            ThreePointArc((10.5032987232, -3.5903643172), (11.1682302184, -3.475534936), (11.4717766718, -2.8728914006))
        make_face()
        with BuildLine():
            ThreePointArc((8.5988852712, -7.8488852712), (8.5368471518, -7.5502074334), (8.3609960692, -7.3009413593))
            ThreePointArc((8.3609960692, -7.3009413593), (7.8488852712, -7.8488852712), (7.3009413593, -8.3609960692))
            ThreePointArc((7.3009413593, -8.3609960692), (8.1241506577, -8.5465449066), (8.5988852712, -7.8488852712))
        make_face()
        with BuildLine():
            ThreePointArc((3.6228914006, -10.7217766718), (3.6147150614, -10.6113336716), (3.5903643172, -10.5032987232))
            ThreePointArc((3.5903643172, -10.5032987232), (2.8728914006, -10.7217766718), (2.1423026541, -10.8913056765))
            ThreePointArc((2.1423026541, -10.8913056765), (2.9582097459, -11.4669080562), (3.6228914006, -10.7217766718))
        make_face()
        with BuildLine():
            ThreePointArc((-2.1228914006, -10.7217766718), (-2.7624484004, -9.979953011), (-3.5903643172, -10.5032987232))
            ThreePointArc((-3.5903643172, -10.5032987232), (-2.8728914006, -10.7217766718), (-2.1423026541, -10.8913056765))
            ThreePointArc((-2.1423026541, -10.8913056765), (-2.1277600163, -10.8070950171), (-2.1228914006, -10.7217766718))
        make_face()
        with BuildLine():
            ThreePointArc((-7.0988852712, -7.8488852712), (-7.5502074334, -7.1609233905), (-8.3609960692, -7.3009413593))
            ThreePointArc((-8.3609960692, -7.3009413593), (-7.8488852712, -7.8488852712), (-7.3009413593, -8.3609960692))
            ThreePointArc((-7.3009413593, -8.3609960692), (-7.1512256357, -8.1241506577), (-7.0988852712, -7.8488852712))
        make_face()
        with BuildLine():
            ThreePointArc((-9.9717766718, -2.8728914006), (-10.2552183976, -2.2856747654), (-10.8913056765, -2.1423026541))
            ThreePointArc((-10.8913056765, -2.1423026541), (-10.7217766718, -2.8728914006), (-10.5032987232, -3.5903643172))
            ThreePointArc((-10.5032987232, -3.5903643172), (-10.1191331364, -3.3193449473), (-9.9717766718, -2.8728914006))
        make_face()
        with BuildLine():
            ThreePointArc((-9.9717766718, 2.8728914006), (-10.1191331364, 3.3193449473), (-10.5032987232, 3.5903643172))
            ThreePointArc((-10.5032987232, 3.5903643172), (-10.7217766718, 2.8728914006), (-10.8913056765, 2.1423026541))
            ThreePointArc((-10.8913056765, 2.1423026541), (-10.2552183976, 2.2856747654), (-9.9717766718, 2.8728914006))
        make_face()
    extrude(amount=F1_DEPTH)

    # F0 (on Front) → F2 (join, through all)
    with BuildSketch(Plane.XZ):
        with BuildLine():
            ThreePointArc((1.6, -9.5), (-1.1313708412, -8.3686291414), (-2.47e-08, -11.1))
            ThreePointArc((-2.47e-08, -11.1), (1.1313708412, -10.6313708586), (1.6, -9.5))
        make_face()
    extrude(amount=F2_DEPTH)

    # F0 (on Front) → F3 (join, through all)
    with BuildSketch(Plane.XZ):
        Circle(F0_R_2)
    extrude(amount=F3_DEPTH)

    # F0 (on Front) → F4 (join)
    with BuildSketch(Plane.XZ):
        with BuildLine():
            ThreePointArc((3.6228914006, -10.7217766718), (3.6147150614, -10.6113336716), (3.5903643172, -10.5032987232))
            ThreePointArc((3.5903643172, -10.5032987232), (2.8728914006, -10.7217766718), (2.1423026541, -10.8913056765))
            ThreePointArc((2.1423026541, -10.8913056765), (2.9582097459, -11.4669080562), (3.6228914006, -10.7217766718))
        make_face()
        with BuildLine():
            ThreePointArc((2.1423026541, -10.8913056765), (2.8728914006, -10.7217766718), (3.5903643172, -10.5032987232))
            ThreePointArc((3.5903643172, -10.5032987232), (2.6787771168, -9.9973323021), (2.1423026541, -10.8913056765))
        make_face()
        with BuildLine():
            ThreePointArc((8.5988852712, -7.8488852712), (8.5368471518, -7.5502074334), (8.3609960692, -7.3009413593))
            ThreePointArc((8.3609960692, -7.3009413593), (7.8488852712, -7.8488852712), (7.3009413593, -8.3609960692))
            ThreePointArc((7.3009413593, -8.3609960692), (8.1241506577, -8.5465449066), (8.5988852712, -7.8488852712))
        make_face()
        with BuildLine():
            ThreePointArc((7.3009413593, -8.3609960692), (7.8488852712, -7.8488852712), (8.3609960692, -7.3009413593))
            ThreePointArc((8.3609960692, -7.3009413593), (7.3185551853, -7.3185551853), (7.3009413593, -8.3609960692))
        make_face()
        with BuildLine():
            ThreePointArc((11.4717766718, -2.8728914006), (11.3089933071, -2.4063331264), (10.8913056765, -2.1423026541))
            ThreePointArc((10.8913056765, -2.1423026541), (10.7217766718, -2.8728914006), (10.5032987232, -3.5903643172))
            ThreePointArc((10.5032987232, -3.5903643172), (11.1682302184, -3.475534936), (11.4717766718, -2.8728914006))
        make_face()
        with BuildLine():
            ThreePointArc((10.5032987232, -3.5903643172), (10.7217766718, -2.8728914006), (10.8913056765, -2.1423026541))
            ThreePointArc((10.8913056765, -2.1423026541), (9.9973323021, -2.6787771168), (10.5032987232, -3.5903643172))
        make_face()
        with BuildLine():
            ThreePointArc((-2.1423026541, -10.8913056765), (-2.8728914006, -10.7217766718), (-3.5903643172, -10.5032987232))
            ThreePointArc((-3.5903643172, -10.5032987232), (-3.0670056845, -11.4462210415), (-2.1423026541, -10.8913056765))
        make_face()
        with BuildLine():
            ThreePointArc((-2.1228914006, -10.7217766718), (-2.7624484004, -9.979953011), (-3.5903643172, -10.5032987232))
            ThreePointArc((-3.5903643172, -10.5032987232), (-2.8728914006, -10.7217766718), (-2.1423026541, -10.8913056765))
            ThreePointArc((-2.1423026541, -10.8913056765), (-2.1277600163, -10.8070950171), (-2.1228914006, -10.7217766718))
        make_face()
        with BuildLine():
            ThreePointArc((-7.3009413593, -8.3609960692), (-7.8488852712, -7.8488852712), (-8.3609960692, -7.3009413593))
            ThreePointArc((-8.3609960692, -7.3009413593), (-8.3792153571, -8.3792153571), (-7.3009413593, -8.3609960692))
        make_face()
        with BuildLine():
            ThreePointArc((-7.0988852712, -7.8488852712), (-7.5502074334, -7.1609233905), (-8.3609960692, -7.3009413593))
            ThreePointArc((-8.3609960692, -7.3009413593), (-7.8488852712, -7.8488852712), (-7.3009413593, -8.3609960692))
            ThreePointArc((-7.3009413593, -8.3609960692), (-7.1512256357, -8.1241506577), (-7.0988852712, -7.8488852712))
        make_face()
        with BuildLine():
            ThreePointArc((-9.9717766718, -2.8728914006), (-10.2552183976, -2.2856747654), (-10.8913056765, -2.1423026541))
            ThreePointArc((-10.8913056765, -2.1423026541), (-10.7217766718, -2.8728914006), (-10.5032987232, -3.5903643172))
            ThreePointArc((-10.5032987232, -3.5903643172), (-10.1191331364, -3.3193449473), (-9.9717766718, -2.8728914006))
        make_face()
        with BuildLine():
            ThreePointArc((-10.5032987232, -3.5903643172), (-10.7217766718, -2.8728914006), (-10.8913056765, -2.1423026541))
            ThreePointArc((-10.8913056765, -2.1423026541), (-11.4462210415, -3.0670056845), (-10.5032987232, -3.5903643172))
        make_face()
        with BuildLine():
            ThreePointArc((-9.9717766718, 2.8728914006), (-10.1191331364, 3.3193449473), (-10.5032987232, 3.5903643172))
            ThreePointArc((-10.5032987232, 3.5903643172), (-10.7217766718, 2.8728914006), (-10.8913056765, 2.1423026541))
            ThreePointArc((-10.8913056765, 2.1423026541), (-10.2552183976, 2.2856747654), (-9.9717766718, 2.8728914006))
        make_face()
        with BuildLine():
            ThreePointArc((-10.8913056765, 2.1423026541), (-10.7217766718, 2.8728914006), (-10.5032987232, 3.5903643172))
            ThreePointArc((-10.5032987232, 3.5903643172), (-11.4462210415, 3.0670056845), (-10.8913056765, 2.1423026541))
        make_face()
        with BuildLine():
            ThreePointArc((-7.0988852712, 7.8488852712), (-7.1512256357, 8.1241506577), (-7.3009413593, 8.3609960692))
            ThreePointArc((-7.3009413593, 8.3609960692), (-7.8488852712, 7.8488852712), (-8.3609960692, 7.3009413593))
            ThreePointArc((-8.3609960692, 7.3009413593), (-7.5502074334, 7.1609233905), (-7.0988852712, 7.8488852712))
        make_face()
        with BuildLine():
            ThreePointArc((-8.3609960692, 7.3009413593), (-7.8488852712, 7.8488852712), (-7.3009413593, 8.3609960692))
            ThreePointArc((-7.3009413593, 8.3609960692), (-8.3792153571, 8.3792153571), (-8.3609960692, 7.3009413593))
        make_face()
        with BuildLine():
            ThreePointArc((3.5903643172, 10.5032987232), (3.6147150614, 10.6113336716), (3.6228914006, 10.7217766718))
            ThreePointArc((3.6228914006, 10.7217766718), (2.9582097459, 11.4669080562), (2.1423026541, 10.8913056765))
            ThreePointArc((2.1423026541, 10.8913056765), (2.8728914006, 10.7217766718), (3.5903643172, 10.5032987232))
        make_face()
        with BuildLine():
            ThreePointArc((3.5903643172, 10.5032987232), (2.8728914006, 10.7217766718), (2.1423026541, 10.8913056765))
            ThreePointArc((2.1423026541, 10.8913056765), (2.6787771168, 9.9973323021), (3.5903643172, 10.5032987232))
        make_face()
        with BuildLine():
            ThreePointArc((10.8913056765, 2.1423026541), (10.7217766718, 2.8728914006), (10.5032987232, 3.5903643172))
            ThreePointArc((10.5032987232, 3.5903643172), (9.9973323021, 2.6787771168), (10.8913056765, 2.1423026541))
        make_face()
        with BuildLine():
            ThreePointArc((11.4717766718, 2.8728914006), (11.1682302184, 3.475534936), (10.5032987232, 3.5903643172))
            ThreePointArc((10.5032987232, 3.5903643172), (10.7217766718, 2.8728914006), (10.8913056765, 2.1423026541))
            ThreePointArc((10.8913056765, 2.1423026541), (11.3089933071, 2.4063331264), (11.4717766718, 2.8728914006))
        make_face()
        with BuildLine():
            ThreePointArc((8.5988852712, 7.8488852712), (8.1241506577, 8.5465449066), (7.3009413593, 8.3609960692))
            ThreePointArc((7.3009413593, 8.3609960692), (7.8488852712, 7.8488852712), (8.3609960692, 7.3009413593))
            ThreePointArc((8.3609960692, 7.3009413593), (8.5368471518, 7.5502074334), (8.5988852712, 7.8488852712))
        make_face()
        with BuildLine():
            ThreePointArc((8.3609960692, 7.3009413593), (7.8488852712, 7.8488852712), (7.3009413593, 8.3609960692))
            ThreePointArc((7.3009413593, 8.3609960692), (7.3185551853, 7.3185551853), (8.3609960692, 7.3009413593))
        make_face()
        with BuildLine():
            ThreePointArc((-2.1228914006, 10.7217766718), (-2.1277600163, 10.8070950171), (-2.1423026541, 10.8913056765))
            ThreePointArc((-2.1423026541, 10.8913056765), (-2.8728914006, 10.7217766718), (-3.5903643172, 10.5032987232))
            ThreePointArc((-3.5903643172, 10.5032987232), (-2.7624484004, 9.979953011), (-2.1228914006, 10.7217766718))
        make_face()
        with BuildLine():
            ThreePointArc((-3.5903643172, 10.5032987232), (-2.8728914006, 10.7217766718), (-2.1423026541, 10.8913056765))
            ThreePointArc((-2.1423026541, 10.8913056765), (-3.0670056845, 11.4462210415), (-3.5903643172, 10.5032987232))
        make_face()
    extrude(amount=-F4_DEPTH)


solid = f1.part
